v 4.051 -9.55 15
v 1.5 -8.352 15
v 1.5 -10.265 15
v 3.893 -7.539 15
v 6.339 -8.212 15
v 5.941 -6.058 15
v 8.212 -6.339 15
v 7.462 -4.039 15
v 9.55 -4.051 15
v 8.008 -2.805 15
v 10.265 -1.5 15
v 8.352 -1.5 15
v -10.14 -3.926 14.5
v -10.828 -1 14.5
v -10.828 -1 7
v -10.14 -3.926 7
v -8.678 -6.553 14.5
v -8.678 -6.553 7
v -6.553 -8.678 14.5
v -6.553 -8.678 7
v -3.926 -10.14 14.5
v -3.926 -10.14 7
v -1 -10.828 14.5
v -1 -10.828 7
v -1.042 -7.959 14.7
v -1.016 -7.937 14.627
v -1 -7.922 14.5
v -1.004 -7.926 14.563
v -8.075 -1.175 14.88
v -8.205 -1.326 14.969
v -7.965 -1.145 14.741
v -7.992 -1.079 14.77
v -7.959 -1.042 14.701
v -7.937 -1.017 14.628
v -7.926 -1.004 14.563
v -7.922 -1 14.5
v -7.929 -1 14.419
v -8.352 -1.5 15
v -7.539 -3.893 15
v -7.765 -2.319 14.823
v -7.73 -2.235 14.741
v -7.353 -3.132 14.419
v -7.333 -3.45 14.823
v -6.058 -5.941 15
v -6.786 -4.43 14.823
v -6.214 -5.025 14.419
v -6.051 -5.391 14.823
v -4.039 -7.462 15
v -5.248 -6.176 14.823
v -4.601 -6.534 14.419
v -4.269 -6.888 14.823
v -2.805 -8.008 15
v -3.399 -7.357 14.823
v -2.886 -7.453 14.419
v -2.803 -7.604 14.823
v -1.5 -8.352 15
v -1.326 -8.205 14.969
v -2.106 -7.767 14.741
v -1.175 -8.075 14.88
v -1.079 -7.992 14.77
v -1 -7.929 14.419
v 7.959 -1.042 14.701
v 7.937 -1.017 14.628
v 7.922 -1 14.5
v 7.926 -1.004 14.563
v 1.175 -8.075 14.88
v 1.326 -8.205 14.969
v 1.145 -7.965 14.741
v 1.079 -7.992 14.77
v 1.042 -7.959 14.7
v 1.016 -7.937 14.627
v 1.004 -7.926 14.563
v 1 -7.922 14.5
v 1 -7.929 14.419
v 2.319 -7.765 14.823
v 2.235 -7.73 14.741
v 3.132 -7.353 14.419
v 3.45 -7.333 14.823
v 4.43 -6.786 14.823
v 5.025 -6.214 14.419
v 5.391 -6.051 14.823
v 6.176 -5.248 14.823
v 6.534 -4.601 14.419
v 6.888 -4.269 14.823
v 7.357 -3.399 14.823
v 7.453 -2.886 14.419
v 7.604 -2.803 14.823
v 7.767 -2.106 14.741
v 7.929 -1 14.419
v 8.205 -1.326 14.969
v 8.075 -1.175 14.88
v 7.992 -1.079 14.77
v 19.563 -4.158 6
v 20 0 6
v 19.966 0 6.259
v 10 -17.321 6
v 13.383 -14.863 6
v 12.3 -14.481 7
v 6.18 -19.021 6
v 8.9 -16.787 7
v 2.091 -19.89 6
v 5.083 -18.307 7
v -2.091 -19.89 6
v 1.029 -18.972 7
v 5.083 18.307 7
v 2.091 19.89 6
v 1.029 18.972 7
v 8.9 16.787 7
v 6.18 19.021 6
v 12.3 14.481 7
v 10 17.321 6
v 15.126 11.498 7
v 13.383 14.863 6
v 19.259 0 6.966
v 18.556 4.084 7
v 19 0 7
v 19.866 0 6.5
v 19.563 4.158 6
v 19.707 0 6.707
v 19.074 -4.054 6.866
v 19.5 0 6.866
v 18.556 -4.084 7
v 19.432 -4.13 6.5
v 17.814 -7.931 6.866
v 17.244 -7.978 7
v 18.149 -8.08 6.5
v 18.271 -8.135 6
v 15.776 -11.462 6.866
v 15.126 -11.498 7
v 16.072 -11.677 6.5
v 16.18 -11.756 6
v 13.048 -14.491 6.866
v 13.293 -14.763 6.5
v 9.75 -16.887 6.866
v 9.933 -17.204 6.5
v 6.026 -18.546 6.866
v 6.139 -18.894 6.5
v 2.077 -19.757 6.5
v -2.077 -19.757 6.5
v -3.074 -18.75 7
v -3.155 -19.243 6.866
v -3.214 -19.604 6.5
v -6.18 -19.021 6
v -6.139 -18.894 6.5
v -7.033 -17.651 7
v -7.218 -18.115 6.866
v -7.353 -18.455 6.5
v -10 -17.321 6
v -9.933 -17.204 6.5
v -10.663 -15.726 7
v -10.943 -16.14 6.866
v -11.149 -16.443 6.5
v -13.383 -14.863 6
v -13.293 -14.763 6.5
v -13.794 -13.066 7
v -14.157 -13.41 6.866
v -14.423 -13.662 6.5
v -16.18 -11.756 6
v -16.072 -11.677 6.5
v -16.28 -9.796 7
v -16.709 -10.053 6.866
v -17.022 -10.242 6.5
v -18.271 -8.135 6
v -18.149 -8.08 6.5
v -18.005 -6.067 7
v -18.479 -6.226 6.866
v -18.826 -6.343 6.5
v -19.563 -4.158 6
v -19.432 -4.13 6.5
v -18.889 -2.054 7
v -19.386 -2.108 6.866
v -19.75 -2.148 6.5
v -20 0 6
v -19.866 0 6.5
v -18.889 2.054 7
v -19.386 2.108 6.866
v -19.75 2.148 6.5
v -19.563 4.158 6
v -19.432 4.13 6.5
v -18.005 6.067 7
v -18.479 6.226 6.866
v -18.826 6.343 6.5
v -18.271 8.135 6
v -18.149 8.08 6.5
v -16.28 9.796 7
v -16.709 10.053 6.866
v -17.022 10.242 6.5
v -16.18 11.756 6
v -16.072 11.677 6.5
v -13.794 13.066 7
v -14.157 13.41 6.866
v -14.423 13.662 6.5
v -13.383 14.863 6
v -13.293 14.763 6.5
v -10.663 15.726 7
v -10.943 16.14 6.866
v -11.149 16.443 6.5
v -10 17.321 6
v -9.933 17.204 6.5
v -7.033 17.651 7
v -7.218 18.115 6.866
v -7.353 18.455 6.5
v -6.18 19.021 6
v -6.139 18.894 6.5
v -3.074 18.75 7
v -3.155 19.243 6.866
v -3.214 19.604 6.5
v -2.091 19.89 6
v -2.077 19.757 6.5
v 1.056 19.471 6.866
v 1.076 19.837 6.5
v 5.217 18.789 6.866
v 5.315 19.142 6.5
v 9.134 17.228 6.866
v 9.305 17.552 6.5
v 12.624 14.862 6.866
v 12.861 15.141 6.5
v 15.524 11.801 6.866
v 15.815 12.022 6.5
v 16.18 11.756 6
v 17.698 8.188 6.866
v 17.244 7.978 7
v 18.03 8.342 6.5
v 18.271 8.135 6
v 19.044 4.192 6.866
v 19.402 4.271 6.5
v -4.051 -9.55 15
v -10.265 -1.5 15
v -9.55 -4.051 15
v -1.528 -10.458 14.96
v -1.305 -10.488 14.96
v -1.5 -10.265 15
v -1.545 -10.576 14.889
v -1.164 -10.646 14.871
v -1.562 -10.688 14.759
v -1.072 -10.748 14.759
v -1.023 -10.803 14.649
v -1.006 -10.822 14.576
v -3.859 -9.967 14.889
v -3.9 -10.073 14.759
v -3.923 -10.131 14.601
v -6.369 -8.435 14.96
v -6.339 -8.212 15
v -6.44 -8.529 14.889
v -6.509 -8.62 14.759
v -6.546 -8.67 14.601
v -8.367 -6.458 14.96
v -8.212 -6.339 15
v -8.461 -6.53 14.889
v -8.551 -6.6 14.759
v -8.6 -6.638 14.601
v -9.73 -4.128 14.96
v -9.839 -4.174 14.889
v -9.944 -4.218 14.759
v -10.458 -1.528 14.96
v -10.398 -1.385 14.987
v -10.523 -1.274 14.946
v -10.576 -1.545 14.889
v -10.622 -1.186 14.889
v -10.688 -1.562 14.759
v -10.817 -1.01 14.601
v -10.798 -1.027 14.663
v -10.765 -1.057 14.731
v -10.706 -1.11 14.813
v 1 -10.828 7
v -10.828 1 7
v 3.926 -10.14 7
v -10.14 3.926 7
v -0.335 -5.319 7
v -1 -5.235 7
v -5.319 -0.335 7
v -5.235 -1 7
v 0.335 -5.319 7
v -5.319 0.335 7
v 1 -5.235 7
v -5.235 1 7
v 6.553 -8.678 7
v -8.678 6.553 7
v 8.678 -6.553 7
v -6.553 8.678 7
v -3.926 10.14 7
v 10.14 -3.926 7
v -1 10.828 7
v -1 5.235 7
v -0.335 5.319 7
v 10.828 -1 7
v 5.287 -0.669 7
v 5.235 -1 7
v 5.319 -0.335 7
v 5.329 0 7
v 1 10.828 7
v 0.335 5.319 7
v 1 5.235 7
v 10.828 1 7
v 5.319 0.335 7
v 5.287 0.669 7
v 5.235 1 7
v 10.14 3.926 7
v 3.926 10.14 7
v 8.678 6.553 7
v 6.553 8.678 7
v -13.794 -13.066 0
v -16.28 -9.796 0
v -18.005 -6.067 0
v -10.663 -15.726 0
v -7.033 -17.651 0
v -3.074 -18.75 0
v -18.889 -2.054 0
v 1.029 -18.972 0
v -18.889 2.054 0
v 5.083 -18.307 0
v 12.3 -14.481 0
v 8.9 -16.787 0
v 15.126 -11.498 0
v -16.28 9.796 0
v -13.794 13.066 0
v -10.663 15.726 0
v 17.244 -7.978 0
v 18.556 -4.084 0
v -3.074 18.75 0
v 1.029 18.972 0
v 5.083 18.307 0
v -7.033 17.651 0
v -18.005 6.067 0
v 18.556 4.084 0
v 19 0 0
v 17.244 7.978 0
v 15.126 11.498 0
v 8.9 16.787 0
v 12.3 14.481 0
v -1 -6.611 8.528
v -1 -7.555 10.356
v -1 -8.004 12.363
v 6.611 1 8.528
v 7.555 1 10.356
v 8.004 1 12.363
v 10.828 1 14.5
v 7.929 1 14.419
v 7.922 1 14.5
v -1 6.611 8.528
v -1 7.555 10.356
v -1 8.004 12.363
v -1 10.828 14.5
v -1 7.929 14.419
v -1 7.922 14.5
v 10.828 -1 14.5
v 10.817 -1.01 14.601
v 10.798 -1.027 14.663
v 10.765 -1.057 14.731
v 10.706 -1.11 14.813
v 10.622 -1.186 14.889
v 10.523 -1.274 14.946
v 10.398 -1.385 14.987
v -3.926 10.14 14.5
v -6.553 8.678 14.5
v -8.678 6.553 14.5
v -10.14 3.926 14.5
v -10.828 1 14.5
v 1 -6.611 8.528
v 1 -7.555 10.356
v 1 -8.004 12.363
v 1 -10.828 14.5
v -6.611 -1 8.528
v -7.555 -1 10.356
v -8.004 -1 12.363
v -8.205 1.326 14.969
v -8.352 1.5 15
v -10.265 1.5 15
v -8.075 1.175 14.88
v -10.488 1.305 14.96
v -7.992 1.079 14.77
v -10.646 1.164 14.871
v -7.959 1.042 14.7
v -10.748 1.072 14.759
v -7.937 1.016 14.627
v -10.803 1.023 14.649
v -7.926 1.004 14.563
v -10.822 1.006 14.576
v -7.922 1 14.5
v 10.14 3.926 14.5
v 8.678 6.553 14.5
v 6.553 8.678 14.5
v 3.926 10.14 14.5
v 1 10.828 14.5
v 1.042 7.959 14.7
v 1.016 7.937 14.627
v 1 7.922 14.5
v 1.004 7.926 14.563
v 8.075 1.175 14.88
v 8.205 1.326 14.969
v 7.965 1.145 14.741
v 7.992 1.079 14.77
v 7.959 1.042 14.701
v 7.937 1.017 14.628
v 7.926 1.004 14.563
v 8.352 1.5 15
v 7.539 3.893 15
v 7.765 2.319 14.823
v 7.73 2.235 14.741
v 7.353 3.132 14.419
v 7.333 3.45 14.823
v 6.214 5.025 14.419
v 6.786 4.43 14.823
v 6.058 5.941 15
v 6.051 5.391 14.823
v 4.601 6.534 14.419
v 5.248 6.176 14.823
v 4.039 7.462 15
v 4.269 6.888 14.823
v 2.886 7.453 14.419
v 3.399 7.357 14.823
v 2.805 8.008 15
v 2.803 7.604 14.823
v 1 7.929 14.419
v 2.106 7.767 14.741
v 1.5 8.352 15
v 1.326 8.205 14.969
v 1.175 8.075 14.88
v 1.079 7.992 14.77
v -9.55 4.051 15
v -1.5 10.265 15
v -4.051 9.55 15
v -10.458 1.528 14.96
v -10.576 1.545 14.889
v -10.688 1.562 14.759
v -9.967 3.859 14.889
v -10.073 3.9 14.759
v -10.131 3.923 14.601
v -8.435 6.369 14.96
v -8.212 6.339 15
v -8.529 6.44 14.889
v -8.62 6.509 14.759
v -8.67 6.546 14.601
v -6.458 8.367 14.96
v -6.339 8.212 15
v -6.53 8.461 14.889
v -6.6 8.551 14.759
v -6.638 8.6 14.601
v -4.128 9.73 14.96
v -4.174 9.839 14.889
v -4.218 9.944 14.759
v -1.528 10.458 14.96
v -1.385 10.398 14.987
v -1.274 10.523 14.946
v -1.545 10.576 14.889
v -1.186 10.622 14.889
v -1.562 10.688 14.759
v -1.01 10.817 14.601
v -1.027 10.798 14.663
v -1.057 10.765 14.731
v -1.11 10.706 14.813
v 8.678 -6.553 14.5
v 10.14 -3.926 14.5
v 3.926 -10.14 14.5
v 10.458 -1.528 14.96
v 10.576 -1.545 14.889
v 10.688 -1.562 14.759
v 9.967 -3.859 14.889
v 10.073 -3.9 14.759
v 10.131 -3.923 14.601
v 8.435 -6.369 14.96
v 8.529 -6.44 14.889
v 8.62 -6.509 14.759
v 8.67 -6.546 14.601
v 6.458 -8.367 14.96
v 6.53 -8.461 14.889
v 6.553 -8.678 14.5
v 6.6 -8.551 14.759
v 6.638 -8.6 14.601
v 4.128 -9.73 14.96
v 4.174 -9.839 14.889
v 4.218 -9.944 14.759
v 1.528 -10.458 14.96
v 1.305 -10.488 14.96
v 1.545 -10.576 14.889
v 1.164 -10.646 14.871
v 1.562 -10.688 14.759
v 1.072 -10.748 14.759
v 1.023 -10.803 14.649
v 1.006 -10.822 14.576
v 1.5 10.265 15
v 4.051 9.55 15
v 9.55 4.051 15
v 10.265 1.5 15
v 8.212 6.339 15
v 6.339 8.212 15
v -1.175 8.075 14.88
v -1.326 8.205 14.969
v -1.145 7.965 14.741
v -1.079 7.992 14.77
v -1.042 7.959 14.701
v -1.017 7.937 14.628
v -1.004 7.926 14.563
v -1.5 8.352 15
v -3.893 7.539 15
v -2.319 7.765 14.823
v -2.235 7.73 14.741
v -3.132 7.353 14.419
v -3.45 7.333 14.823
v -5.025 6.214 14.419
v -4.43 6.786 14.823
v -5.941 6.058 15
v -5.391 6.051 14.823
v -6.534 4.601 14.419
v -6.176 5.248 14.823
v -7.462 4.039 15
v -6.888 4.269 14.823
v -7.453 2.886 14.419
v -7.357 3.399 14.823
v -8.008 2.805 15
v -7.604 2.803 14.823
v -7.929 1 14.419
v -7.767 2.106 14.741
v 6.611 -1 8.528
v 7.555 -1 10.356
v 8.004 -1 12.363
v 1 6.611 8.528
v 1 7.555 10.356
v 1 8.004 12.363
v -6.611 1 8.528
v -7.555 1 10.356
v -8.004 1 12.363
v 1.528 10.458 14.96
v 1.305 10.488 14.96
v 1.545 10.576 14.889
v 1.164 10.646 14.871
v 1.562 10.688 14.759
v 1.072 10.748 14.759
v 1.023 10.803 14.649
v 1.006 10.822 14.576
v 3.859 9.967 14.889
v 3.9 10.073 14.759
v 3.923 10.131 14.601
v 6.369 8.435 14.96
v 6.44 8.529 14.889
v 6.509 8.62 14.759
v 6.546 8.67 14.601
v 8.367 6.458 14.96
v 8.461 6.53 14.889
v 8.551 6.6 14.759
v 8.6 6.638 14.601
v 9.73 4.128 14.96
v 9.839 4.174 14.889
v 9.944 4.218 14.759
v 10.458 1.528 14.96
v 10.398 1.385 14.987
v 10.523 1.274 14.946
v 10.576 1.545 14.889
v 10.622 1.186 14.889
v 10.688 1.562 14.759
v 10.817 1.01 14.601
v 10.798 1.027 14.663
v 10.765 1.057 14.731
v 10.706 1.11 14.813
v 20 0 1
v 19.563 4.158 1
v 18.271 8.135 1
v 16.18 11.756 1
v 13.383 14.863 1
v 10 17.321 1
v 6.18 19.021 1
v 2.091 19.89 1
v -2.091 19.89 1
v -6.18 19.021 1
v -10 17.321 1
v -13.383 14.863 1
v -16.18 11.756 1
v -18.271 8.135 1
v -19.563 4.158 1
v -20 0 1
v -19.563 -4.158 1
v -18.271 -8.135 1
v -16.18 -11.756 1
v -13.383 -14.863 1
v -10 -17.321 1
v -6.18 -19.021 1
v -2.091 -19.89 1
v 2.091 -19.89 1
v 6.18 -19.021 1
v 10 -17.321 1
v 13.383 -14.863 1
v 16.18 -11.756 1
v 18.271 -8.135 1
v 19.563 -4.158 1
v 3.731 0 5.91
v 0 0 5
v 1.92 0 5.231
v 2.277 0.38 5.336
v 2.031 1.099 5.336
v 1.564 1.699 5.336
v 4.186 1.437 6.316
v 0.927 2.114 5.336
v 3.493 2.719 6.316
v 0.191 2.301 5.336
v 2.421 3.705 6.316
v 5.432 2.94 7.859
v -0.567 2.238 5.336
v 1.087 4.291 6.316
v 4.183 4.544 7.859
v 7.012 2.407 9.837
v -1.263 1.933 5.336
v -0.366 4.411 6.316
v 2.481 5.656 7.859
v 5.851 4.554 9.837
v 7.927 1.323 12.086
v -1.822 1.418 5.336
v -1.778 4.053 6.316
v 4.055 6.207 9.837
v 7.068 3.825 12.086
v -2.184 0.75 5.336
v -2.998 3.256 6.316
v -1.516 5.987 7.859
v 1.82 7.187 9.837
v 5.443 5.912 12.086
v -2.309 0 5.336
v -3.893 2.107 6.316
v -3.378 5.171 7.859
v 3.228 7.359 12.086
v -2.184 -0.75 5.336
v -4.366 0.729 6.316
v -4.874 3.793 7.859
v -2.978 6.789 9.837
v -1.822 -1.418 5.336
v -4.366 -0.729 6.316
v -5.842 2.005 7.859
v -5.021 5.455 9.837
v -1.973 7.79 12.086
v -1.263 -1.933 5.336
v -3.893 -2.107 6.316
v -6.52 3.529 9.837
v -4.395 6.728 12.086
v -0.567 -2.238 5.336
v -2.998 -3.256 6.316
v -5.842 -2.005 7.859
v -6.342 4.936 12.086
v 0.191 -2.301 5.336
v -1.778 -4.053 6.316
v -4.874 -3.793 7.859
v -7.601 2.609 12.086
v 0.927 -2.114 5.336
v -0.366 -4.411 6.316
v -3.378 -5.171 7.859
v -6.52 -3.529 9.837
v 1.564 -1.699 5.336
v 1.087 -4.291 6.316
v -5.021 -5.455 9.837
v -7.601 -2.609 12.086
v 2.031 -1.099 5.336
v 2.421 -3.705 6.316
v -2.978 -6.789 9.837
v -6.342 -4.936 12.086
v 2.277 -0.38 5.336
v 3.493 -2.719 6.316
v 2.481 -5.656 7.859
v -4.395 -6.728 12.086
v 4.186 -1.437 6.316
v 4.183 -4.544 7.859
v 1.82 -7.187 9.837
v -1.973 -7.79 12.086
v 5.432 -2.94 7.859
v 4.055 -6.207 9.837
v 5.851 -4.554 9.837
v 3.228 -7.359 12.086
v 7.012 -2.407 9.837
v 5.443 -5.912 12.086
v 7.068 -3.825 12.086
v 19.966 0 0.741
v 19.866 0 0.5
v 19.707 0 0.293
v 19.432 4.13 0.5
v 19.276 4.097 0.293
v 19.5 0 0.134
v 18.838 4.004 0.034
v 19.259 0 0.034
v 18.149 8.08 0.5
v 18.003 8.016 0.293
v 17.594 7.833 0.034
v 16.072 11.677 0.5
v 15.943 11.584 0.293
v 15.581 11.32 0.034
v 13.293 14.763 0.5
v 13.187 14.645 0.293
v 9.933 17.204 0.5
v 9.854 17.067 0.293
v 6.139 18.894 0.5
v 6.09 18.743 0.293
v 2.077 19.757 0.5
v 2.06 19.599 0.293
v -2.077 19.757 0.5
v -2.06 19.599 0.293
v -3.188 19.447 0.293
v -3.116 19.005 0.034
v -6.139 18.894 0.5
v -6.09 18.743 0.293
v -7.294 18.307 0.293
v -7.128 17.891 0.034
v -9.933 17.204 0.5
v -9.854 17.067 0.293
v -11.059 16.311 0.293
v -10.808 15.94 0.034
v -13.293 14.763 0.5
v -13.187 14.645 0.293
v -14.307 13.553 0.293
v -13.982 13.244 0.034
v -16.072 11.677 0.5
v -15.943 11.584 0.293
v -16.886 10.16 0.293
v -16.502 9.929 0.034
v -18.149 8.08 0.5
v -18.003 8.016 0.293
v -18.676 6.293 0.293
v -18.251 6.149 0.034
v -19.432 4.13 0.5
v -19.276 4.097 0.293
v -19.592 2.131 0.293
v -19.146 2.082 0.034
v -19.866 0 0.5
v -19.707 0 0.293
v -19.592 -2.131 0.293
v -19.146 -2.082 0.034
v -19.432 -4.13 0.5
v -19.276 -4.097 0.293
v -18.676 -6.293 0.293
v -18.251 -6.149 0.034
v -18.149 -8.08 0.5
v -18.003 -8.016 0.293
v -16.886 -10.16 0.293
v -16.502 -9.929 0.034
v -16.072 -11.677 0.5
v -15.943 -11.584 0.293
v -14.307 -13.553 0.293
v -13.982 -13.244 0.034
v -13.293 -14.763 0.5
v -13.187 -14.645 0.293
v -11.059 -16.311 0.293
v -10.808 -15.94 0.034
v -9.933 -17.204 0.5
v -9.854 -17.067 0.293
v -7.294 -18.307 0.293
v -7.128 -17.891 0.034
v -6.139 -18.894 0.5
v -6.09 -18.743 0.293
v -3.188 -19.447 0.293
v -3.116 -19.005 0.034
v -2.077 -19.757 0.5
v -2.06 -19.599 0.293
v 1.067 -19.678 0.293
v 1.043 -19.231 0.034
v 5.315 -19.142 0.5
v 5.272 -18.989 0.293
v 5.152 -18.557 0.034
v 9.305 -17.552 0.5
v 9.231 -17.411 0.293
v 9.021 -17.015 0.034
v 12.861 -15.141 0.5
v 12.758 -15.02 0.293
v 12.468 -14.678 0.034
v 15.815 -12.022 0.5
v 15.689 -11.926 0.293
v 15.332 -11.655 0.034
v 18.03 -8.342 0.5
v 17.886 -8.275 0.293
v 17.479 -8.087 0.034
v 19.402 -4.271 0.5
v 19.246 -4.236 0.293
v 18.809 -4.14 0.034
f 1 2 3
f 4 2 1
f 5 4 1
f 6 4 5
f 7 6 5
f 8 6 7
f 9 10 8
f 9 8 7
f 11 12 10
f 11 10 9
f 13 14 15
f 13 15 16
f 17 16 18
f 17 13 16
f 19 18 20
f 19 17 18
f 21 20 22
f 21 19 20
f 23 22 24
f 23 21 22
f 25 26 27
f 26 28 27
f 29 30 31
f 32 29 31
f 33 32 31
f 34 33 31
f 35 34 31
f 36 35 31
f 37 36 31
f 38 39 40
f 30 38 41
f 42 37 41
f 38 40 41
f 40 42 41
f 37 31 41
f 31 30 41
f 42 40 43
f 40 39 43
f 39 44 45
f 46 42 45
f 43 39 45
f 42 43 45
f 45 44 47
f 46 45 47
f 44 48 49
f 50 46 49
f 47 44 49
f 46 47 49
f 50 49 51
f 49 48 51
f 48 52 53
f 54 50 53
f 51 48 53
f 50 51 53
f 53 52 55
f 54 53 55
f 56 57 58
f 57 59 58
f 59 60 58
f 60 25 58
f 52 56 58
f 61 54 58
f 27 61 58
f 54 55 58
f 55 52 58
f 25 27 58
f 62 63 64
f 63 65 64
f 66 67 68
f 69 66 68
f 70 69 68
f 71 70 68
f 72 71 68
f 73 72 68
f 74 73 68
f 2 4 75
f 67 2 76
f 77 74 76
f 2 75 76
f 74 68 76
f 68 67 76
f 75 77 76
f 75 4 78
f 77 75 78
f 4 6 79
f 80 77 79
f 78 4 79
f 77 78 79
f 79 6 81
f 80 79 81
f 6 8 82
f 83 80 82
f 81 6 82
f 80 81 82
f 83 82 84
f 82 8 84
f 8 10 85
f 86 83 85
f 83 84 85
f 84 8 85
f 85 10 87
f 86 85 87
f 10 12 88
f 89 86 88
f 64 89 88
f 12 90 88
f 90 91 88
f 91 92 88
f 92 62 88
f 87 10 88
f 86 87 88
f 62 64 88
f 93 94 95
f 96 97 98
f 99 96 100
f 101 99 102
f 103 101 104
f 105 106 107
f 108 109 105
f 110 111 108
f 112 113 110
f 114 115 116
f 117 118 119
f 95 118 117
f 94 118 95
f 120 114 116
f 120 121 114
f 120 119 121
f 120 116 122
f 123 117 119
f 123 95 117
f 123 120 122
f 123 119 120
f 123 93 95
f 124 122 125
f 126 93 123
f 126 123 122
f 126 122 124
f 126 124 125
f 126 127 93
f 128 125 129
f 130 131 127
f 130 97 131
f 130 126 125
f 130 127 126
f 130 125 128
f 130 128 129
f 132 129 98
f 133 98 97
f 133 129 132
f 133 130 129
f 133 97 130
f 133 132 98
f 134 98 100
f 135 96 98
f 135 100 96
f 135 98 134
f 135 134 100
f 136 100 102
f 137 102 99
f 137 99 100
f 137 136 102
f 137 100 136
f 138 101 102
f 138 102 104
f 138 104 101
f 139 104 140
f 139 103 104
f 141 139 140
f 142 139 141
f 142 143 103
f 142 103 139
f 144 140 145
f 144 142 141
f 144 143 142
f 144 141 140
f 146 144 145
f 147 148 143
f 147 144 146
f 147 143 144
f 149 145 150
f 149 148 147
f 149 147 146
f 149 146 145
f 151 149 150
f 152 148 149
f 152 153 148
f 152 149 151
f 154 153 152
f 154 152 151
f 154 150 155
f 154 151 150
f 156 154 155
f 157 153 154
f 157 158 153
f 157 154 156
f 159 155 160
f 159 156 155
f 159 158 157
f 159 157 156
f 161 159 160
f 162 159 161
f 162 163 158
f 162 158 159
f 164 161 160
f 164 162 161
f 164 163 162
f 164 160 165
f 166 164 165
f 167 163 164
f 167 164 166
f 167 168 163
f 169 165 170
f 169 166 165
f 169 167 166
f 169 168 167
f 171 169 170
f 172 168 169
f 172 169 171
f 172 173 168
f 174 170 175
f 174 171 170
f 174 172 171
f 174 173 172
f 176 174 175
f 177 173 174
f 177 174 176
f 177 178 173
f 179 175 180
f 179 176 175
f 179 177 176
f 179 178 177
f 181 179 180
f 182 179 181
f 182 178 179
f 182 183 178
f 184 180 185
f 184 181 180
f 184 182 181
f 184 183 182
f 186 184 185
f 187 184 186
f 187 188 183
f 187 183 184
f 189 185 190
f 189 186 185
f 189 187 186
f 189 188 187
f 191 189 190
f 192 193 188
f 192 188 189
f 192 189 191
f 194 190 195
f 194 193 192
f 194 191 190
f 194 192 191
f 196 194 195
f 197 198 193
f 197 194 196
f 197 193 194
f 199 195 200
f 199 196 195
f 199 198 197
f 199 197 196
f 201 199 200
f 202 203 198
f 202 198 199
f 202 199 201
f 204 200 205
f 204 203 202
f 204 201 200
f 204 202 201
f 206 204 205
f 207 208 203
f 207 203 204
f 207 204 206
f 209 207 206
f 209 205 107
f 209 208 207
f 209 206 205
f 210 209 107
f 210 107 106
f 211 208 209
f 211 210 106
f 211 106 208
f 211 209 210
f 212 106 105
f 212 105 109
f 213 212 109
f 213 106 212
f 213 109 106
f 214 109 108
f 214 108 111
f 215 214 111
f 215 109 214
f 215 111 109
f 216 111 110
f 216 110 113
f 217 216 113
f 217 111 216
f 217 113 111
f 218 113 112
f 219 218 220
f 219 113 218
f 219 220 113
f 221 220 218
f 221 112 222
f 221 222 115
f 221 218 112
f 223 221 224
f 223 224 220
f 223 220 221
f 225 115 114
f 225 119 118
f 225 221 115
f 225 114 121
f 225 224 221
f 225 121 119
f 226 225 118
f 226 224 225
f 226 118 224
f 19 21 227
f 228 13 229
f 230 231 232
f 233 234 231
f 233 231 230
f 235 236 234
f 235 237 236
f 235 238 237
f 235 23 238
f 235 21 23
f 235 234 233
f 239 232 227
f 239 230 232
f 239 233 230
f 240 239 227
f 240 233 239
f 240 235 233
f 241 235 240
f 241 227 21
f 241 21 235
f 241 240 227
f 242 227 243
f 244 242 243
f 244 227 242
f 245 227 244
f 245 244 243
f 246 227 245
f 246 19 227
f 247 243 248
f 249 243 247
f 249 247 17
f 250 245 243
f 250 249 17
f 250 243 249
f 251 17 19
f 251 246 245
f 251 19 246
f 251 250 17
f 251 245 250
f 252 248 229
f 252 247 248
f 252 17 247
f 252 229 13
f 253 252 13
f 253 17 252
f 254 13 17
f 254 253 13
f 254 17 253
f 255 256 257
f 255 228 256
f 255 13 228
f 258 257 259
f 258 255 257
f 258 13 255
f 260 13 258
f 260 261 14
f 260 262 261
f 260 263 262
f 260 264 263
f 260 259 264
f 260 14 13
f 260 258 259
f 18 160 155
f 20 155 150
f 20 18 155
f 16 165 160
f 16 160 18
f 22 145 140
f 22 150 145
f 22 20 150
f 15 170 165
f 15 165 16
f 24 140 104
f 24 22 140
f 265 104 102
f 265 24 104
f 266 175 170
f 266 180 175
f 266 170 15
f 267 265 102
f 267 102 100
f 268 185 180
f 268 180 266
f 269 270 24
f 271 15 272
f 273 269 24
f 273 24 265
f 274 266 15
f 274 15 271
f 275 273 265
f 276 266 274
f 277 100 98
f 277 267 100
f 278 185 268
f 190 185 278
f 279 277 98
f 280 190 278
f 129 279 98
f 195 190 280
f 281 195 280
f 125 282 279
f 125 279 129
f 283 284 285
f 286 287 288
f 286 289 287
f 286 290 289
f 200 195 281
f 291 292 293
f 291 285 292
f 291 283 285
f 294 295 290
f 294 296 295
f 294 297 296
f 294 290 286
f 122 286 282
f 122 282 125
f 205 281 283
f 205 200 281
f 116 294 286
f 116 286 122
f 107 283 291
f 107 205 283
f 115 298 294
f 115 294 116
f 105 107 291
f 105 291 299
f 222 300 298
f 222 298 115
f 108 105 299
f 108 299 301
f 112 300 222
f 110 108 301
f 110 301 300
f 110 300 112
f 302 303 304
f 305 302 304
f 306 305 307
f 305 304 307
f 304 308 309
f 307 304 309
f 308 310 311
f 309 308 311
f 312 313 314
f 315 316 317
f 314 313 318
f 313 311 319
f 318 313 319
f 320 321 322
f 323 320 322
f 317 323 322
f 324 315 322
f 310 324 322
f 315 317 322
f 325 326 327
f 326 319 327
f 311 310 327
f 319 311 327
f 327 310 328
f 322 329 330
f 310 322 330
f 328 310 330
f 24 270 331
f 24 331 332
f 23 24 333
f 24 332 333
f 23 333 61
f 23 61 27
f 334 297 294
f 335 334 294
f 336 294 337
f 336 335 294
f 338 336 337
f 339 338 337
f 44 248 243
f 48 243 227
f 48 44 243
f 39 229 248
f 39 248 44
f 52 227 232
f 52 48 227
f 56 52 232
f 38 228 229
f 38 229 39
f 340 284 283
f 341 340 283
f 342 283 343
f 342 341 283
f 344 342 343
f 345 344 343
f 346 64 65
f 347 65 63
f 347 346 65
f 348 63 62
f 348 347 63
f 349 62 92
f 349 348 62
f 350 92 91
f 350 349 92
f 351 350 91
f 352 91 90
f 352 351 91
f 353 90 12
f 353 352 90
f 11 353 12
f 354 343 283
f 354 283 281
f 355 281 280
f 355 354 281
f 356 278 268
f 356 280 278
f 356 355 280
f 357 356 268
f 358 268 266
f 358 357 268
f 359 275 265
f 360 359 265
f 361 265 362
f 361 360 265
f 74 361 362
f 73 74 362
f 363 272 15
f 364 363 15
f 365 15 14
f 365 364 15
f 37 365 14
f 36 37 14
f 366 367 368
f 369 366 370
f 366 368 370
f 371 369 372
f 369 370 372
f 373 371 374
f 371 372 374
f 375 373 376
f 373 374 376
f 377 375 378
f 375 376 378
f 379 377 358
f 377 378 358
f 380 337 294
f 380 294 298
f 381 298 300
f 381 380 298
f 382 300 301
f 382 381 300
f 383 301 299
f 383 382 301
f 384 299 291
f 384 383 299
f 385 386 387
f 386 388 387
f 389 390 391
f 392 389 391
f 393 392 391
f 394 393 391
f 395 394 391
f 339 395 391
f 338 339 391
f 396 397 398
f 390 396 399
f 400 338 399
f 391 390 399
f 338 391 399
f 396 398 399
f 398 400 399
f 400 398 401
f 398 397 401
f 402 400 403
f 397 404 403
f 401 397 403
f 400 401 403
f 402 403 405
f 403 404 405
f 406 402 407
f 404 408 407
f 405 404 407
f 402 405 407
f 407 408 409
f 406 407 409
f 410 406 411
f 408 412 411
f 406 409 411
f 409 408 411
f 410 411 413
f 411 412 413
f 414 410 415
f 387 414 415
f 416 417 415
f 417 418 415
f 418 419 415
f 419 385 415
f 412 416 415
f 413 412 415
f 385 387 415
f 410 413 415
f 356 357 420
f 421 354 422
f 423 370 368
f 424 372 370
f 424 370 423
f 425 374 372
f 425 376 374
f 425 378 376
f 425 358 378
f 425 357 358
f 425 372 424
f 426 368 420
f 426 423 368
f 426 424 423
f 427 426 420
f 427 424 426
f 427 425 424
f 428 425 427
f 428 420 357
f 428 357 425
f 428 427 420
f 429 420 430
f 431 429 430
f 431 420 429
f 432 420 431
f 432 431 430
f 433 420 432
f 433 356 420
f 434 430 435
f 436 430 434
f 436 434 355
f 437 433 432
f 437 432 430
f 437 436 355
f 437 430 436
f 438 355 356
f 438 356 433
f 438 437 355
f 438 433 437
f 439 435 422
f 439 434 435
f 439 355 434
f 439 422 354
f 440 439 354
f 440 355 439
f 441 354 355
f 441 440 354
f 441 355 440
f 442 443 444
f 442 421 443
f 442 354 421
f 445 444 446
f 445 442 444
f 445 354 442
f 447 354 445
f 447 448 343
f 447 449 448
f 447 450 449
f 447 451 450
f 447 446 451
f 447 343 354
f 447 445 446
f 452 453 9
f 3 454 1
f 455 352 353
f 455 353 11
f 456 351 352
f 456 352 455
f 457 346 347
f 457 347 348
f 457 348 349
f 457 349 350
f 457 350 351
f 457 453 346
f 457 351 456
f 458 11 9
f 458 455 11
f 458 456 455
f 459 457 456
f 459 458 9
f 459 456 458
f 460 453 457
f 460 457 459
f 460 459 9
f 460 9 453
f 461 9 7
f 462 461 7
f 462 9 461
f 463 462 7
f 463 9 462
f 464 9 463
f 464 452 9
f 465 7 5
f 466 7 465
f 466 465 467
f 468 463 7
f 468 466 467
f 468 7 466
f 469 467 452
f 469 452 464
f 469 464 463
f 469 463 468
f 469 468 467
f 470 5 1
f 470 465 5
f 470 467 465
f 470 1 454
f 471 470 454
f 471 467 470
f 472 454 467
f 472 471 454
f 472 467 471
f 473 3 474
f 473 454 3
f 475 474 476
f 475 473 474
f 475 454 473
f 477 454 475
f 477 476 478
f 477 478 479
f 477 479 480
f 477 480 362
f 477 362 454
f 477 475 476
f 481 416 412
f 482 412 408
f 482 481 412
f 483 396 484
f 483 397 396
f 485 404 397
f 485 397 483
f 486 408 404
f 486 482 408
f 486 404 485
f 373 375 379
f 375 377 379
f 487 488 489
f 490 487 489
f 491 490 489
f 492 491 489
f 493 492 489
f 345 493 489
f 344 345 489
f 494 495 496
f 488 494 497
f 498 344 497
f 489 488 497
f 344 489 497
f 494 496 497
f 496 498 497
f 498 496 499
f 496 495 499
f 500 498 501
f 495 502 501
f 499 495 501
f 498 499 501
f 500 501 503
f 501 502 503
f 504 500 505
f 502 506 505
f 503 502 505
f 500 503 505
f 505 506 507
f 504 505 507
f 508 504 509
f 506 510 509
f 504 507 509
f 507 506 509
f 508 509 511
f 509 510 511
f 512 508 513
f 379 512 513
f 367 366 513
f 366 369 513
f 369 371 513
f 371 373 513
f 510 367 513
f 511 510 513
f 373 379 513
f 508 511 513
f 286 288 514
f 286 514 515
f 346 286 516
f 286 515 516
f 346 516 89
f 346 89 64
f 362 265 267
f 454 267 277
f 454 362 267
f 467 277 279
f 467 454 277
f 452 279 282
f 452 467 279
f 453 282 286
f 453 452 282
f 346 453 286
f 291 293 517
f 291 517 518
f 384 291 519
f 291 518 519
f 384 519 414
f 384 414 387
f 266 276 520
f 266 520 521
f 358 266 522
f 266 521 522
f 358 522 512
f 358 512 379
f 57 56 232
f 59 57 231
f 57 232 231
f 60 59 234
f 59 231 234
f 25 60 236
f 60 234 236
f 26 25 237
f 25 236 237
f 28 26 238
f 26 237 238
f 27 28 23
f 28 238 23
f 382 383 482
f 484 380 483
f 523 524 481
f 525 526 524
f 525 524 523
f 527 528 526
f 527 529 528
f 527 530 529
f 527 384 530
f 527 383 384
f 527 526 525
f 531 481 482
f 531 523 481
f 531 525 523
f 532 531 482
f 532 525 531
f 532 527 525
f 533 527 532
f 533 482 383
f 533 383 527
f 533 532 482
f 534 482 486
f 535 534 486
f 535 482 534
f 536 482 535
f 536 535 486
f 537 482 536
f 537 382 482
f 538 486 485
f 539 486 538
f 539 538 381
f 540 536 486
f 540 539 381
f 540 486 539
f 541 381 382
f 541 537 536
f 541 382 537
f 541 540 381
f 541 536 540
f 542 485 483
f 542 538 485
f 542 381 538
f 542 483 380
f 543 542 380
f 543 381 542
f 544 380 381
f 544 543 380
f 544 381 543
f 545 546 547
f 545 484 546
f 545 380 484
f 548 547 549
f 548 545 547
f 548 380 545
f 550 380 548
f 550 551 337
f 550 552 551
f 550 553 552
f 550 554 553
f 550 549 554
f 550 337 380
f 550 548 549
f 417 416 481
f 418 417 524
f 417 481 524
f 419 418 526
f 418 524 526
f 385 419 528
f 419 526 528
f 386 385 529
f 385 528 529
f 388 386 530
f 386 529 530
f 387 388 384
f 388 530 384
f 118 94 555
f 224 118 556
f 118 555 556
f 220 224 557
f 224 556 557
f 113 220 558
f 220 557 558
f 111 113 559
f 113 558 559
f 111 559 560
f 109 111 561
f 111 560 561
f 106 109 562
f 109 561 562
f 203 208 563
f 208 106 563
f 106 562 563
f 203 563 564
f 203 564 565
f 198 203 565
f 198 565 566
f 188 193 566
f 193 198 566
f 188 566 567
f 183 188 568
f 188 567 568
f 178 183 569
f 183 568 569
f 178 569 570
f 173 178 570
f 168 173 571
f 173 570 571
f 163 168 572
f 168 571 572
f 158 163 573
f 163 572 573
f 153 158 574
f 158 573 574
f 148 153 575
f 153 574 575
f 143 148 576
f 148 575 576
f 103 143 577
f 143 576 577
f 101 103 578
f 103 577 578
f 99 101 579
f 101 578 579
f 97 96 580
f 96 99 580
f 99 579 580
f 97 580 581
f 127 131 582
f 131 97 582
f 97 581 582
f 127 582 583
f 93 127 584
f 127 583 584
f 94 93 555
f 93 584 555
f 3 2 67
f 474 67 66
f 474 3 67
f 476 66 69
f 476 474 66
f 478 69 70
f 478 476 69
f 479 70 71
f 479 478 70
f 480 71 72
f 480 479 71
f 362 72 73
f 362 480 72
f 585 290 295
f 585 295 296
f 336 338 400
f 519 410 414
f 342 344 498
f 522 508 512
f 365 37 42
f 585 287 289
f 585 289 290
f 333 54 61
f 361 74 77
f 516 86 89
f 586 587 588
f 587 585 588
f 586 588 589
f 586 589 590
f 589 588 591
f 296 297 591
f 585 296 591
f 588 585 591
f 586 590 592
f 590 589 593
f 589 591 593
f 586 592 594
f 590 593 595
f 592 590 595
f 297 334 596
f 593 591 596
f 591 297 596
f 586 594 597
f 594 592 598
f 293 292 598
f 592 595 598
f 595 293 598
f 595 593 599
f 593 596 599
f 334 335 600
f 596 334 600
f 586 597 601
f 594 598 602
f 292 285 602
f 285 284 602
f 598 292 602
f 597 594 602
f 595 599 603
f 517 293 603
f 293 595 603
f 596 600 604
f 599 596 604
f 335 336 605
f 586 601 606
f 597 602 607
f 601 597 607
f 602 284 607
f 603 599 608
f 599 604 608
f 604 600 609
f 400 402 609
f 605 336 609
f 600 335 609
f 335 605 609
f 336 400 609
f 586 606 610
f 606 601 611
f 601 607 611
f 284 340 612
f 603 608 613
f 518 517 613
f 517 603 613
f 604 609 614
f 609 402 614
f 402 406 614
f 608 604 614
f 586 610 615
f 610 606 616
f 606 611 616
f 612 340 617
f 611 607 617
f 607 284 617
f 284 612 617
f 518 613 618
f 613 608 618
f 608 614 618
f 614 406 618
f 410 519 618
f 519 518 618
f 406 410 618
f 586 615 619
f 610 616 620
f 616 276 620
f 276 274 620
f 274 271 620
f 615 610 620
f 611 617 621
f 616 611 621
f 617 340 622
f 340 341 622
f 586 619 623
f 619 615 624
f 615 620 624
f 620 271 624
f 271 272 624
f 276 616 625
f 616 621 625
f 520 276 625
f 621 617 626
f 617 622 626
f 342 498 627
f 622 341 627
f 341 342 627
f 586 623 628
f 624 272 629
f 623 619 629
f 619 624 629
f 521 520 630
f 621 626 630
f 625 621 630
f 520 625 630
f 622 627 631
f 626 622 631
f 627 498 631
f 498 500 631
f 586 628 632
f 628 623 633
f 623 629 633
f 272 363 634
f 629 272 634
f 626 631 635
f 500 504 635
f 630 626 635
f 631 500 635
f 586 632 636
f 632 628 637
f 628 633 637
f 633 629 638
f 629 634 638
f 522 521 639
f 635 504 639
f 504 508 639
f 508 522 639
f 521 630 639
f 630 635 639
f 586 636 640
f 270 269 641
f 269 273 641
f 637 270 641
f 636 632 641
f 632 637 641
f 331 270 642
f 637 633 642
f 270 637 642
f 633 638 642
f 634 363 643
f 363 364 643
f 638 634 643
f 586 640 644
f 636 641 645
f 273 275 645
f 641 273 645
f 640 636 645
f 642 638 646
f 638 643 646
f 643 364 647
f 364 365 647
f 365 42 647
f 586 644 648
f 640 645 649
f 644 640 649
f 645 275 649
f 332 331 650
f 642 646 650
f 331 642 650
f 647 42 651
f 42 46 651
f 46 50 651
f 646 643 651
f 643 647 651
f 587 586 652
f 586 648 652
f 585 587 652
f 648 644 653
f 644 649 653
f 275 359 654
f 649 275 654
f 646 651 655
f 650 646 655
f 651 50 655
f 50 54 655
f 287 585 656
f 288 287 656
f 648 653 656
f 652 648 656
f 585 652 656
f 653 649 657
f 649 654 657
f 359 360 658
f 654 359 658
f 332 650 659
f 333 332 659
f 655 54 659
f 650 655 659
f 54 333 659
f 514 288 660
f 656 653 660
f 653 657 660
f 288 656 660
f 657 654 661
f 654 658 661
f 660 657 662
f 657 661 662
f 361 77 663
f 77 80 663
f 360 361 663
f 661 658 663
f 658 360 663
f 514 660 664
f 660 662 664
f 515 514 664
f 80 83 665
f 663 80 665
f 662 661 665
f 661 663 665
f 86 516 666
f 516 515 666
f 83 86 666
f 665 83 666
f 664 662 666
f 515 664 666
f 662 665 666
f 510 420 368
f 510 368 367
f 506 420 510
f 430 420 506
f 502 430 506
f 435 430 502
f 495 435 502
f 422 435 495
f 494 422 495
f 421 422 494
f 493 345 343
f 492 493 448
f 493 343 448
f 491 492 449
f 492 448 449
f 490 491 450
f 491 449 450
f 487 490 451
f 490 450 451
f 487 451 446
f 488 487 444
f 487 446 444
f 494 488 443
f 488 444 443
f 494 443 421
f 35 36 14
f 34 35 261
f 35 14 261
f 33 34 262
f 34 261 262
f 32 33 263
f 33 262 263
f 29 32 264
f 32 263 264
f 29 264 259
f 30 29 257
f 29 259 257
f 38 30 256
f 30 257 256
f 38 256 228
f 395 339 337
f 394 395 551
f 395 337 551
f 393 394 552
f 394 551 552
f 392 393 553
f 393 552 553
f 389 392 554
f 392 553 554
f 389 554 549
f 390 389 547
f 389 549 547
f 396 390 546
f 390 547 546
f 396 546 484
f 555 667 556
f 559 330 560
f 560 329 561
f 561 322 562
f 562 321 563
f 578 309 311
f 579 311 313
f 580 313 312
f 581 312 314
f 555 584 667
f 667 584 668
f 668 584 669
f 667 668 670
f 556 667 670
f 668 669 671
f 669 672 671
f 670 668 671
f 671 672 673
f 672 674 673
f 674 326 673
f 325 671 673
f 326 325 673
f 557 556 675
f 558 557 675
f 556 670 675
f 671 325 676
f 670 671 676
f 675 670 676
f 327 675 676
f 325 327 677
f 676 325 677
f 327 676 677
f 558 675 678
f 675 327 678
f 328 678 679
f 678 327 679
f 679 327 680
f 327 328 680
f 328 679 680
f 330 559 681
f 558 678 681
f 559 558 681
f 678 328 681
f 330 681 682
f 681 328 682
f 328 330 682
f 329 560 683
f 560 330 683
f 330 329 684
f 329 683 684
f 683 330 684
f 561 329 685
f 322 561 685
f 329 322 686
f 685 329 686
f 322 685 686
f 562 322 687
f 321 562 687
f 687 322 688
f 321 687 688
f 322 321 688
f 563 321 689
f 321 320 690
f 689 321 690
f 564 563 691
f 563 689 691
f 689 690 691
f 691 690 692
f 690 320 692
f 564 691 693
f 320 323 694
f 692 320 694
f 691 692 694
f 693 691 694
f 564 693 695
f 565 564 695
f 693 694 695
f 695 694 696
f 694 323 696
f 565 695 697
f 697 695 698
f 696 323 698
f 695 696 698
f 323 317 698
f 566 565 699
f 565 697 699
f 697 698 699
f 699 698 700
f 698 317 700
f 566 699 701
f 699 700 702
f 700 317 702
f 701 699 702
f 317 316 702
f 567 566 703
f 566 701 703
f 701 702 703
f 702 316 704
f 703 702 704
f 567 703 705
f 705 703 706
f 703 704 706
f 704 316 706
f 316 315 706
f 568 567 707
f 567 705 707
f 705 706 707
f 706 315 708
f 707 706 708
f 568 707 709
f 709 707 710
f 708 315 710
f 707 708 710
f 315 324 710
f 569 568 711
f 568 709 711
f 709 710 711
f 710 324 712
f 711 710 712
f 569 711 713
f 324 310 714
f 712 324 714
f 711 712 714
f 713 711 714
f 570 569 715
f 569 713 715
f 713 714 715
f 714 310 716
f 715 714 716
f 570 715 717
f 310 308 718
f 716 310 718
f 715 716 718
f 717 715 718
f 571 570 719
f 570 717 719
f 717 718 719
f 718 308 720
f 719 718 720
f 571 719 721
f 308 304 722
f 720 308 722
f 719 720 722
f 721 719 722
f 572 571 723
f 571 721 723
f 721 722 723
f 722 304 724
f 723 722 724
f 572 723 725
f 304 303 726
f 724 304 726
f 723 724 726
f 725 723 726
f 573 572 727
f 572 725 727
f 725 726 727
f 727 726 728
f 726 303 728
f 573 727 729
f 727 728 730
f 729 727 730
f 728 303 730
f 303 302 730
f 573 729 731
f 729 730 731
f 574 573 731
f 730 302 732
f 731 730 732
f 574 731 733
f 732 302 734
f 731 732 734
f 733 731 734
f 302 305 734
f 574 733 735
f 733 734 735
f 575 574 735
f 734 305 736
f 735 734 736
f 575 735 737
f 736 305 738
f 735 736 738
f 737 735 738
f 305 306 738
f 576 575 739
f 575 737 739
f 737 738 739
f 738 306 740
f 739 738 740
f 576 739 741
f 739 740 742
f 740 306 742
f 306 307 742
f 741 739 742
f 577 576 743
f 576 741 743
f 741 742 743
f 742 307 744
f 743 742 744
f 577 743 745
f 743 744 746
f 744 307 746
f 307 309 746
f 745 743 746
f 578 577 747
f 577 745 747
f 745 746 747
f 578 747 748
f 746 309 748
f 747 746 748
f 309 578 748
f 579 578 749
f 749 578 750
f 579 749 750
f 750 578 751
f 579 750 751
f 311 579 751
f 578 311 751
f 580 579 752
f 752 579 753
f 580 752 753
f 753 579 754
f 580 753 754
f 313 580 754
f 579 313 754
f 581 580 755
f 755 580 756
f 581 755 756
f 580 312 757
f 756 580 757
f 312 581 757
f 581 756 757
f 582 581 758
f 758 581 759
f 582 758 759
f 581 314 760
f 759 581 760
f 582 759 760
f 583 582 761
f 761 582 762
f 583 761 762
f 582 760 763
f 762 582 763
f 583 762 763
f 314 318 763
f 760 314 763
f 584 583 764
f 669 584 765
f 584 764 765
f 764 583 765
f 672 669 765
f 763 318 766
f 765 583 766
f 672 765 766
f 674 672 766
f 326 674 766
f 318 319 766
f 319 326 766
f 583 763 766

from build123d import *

# Parameters (mm, degrees)
F0_R          = 20
F1_DEPTH      = 15
F4_R          = 20
F4_R_2        = 10.874007874
F5_DEPTH      = 8
F6_W          = 2
F6_H          = 8
F7_DEPTH      = 20.001
F7_DEPTH_BACK = 20.001
F8_W          = 2
F8_H          = 8
F9_DEPTH      = 20.001
F9_DEPTH_BACK = 20.001
F10_R         = 0.5
F11_R         = 1


with BuildPart() as f1:
    # F0 (on Top) → F1 (new body)
    with BuildSketch(Plane.XY):
        Circle(F0_R)
    extrude(amount=F1_DEPTH)

    # F2 (on Front) → F3 (revolve, cut)
    with BuildSketch(Plane.XZ):
        with BuildLine():
            Line((0, 21.2), (0, 5))
            ThreePointArc((0, 5), (8.1, 13.1), (0, 21.2))
        make_face()
    revolve(axis=Axis((0, 0, 13.1), (0, 0, 1)), mode=Mode.SUBTRACT)

    # F4 (on face) → F5 (cut)
    with BuildSketch(Plane.XY.offset(15)):
        Circle(F4_R)
        Circle(F4_R_2, mode=Mode.SUBTRACT)
    extrude(amount=-F5_DEPTH, mode=Mode.SUBTRACT)

    # F6 (on Front) → F7 (cut, two sides)
    with BuildSketch(Plane.XZ) as f7_sk:
        with Locations((0, 11)):
            Rectangle(F6_W, F6_H)
    extrude(amount=-F7_DEPTH, mode=Mode.SUBTRACT)
    extrude(f7_sk.sketch, amount=F7_DEPTH_BACK, mode=Mode.SUBTRACT)

    # F8 (on Right) → F9 (cut, two sides)
    with BuildSketch(Plane.YZ) as f9_sk:
        with Locations((0, 11)):
            Rectangle(F8_W, F8_H)
    extrude(amount=-F9_DEPTH, mode=Mode.SUBTRACT)
    extrude(f9_sk.sketch, amount=F9_DEPTH_BACK, mode=Mode.SUBTRACT)

    # F10
    f10_edges = [f1.edges().sort_by_distance(p)[0] for p in [
        (-9.319089, -1, 15),
        (-5.567764, -5.567764, 15),
        (-1, -9.319089, 15),
        (-7.689085, -7.689085, 15),
        (-1, 9.319089, 15),
        (-5.567764, 5.567764, 15),
        (-9.319089, 1, 15),
        (-7.689085, 7.689085, 15),
        (1, -9.319089, 15),
        (5.567764, -5.567764, 15),
        (9.319089, -1, 15),
        (7.689085, -7.689085, 15),
        (9.319089, 1, 15),
        (5.567764, 5.567764, 15),
        (1, 9.319089, 15),
        (7.689085, 7.689085, 15),
    ]]
    fillet(f10_edges, radius=F10_R)

    # F11
    f11_edges = [f1.edges().sort_by_distance(p)[0] for p in [
        (-20, 0, 0),
        (20, 0, 3.5),
        (-20, 0, 7),
    ]]
    fillet(f11_edges, radius=F11_R)


solid = f1.part
